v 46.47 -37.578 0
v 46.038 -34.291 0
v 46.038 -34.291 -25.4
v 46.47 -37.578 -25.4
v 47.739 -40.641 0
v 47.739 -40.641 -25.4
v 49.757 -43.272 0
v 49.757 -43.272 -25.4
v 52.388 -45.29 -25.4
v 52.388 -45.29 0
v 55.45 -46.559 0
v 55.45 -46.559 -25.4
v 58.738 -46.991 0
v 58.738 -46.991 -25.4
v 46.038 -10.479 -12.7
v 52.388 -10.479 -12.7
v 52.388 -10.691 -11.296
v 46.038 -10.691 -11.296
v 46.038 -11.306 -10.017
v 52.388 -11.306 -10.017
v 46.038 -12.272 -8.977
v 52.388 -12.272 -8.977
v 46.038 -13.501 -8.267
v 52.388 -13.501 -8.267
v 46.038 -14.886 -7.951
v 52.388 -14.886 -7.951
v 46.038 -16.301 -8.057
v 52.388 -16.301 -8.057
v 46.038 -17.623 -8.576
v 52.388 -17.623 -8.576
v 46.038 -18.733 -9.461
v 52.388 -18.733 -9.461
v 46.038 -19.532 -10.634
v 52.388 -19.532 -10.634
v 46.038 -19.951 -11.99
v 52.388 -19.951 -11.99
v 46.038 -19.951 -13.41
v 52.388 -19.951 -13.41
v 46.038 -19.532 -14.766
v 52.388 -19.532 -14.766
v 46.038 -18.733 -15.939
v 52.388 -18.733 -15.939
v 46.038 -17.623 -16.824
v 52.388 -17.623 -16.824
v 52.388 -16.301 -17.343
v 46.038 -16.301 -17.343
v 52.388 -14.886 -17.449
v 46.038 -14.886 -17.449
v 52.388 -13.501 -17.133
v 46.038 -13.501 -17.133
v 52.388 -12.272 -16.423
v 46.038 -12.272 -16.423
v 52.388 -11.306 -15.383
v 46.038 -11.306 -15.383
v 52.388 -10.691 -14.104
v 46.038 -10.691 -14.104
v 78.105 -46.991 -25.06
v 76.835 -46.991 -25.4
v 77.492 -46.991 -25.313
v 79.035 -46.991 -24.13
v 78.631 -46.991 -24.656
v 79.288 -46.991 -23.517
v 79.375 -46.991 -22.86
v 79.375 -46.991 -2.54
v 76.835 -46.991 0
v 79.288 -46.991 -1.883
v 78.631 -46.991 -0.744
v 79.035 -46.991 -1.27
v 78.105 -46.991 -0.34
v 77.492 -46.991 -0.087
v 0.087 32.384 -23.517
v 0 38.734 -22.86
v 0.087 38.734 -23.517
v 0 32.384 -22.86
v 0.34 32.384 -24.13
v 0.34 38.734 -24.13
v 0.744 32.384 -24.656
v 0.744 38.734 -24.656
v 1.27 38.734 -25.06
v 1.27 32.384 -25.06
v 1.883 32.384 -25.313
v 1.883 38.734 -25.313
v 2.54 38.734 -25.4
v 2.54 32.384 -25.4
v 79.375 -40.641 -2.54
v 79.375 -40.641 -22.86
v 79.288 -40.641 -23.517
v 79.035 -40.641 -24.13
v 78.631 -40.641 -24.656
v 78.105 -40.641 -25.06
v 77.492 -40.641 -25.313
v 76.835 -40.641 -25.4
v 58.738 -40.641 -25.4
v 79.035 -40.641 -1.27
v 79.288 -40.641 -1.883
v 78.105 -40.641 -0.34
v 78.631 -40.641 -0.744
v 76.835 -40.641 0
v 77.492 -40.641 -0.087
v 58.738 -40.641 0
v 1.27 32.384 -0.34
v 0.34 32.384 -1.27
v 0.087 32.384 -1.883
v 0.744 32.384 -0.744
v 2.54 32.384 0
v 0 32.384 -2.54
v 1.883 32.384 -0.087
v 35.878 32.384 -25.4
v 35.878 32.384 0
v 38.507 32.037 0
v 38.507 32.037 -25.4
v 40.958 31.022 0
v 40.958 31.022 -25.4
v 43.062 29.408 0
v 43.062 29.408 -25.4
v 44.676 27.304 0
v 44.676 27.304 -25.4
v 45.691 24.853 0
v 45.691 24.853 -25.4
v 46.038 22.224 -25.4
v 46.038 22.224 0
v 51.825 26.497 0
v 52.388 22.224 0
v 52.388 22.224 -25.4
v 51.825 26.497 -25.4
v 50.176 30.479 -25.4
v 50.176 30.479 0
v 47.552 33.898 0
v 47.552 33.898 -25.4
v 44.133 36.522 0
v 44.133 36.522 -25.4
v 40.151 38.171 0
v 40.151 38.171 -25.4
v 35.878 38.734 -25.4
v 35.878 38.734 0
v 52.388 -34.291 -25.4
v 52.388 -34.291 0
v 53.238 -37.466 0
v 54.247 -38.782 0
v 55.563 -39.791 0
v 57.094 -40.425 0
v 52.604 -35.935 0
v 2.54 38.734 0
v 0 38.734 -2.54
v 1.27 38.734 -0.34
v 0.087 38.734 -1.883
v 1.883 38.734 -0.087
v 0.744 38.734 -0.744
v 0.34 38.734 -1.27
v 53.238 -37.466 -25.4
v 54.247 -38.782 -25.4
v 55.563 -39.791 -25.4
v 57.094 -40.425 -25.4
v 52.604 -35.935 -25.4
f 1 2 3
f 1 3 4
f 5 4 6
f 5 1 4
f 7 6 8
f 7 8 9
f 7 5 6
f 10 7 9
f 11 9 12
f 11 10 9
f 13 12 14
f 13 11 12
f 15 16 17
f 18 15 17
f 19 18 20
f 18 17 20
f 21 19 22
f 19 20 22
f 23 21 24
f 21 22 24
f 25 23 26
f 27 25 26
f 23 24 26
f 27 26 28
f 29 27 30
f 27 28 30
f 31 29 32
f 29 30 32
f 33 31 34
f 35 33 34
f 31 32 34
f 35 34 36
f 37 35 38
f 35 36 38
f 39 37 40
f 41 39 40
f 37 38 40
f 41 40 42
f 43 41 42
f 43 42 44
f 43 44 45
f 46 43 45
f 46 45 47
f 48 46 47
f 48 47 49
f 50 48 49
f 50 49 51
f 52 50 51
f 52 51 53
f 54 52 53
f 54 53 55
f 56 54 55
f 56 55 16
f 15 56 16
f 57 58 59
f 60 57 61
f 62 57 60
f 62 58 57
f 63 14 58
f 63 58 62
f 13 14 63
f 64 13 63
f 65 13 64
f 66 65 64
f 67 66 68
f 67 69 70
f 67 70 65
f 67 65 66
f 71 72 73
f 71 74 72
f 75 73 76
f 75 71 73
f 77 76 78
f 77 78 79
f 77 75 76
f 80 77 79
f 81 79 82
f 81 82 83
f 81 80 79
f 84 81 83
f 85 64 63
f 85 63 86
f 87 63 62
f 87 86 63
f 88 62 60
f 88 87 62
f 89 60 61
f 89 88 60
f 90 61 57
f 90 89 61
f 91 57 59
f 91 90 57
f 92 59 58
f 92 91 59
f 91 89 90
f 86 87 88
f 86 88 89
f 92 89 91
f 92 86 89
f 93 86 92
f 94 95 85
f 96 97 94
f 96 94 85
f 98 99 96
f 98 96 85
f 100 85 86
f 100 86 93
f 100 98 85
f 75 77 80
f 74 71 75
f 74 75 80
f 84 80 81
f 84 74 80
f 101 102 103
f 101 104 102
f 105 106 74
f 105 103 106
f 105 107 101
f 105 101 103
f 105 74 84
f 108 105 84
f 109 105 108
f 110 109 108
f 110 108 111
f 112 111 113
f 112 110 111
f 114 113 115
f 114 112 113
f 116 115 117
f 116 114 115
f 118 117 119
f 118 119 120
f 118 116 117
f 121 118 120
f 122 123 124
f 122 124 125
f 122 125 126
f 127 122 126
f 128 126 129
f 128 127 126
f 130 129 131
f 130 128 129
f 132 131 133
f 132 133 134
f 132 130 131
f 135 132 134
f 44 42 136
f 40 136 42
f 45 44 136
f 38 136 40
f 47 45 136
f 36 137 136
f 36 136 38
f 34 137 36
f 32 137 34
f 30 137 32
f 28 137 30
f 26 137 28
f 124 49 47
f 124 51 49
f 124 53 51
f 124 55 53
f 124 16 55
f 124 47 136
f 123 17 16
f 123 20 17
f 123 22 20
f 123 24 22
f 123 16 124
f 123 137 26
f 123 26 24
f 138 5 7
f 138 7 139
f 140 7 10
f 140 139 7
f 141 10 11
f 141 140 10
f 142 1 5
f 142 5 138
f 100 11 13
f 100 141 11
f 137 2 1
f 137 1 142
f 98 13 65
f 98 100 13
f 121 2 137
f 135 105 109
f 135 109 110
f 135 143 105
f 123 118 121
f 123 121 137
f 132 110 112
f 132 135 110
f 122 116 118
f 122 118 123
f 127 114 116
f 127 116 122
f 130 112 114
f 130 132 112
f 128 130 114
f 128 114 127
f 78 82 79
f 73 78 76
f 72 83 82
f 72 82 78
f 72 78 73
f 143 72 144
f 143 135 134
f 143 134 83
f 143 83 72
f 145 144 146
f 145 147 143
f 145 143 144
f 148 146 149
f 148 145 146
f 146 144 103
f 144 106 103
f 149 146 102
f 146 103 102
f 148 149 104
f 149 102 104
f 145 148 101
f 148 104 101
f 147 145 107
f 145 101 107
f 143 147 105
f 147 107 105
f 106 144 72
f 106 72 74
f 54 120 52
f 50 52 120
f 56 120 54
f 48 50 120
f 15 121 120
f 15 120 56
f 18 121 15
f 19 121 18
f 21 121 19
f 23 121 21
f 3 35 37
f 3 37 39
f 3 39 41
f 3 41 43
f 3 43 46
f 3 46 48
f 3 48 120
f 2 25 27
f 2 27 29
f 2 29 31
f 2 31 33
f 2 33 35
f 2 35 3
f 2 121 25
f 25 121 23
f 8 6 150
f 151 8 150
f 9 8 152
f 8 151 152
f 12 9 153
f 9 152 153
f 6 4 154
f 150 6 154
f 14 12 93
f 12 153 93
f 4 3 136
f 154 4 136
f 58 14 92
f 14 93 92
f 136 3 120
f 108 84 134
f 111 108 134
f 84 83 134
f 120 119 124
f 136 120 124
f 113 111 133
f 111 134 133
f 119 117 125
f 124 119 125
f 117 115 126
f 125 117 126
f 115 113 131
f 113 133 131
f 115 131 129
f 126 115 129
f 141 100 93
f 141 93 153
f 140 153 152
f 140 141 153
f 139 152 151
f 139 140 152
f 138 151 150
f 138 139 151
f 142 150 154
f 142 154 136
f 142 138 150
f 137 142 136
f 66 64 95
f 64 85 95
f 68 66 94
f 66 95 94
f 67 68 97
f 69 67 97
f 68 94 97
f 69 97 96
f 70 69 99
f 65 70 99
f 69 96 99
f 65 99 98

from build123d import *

# Parameters (mm, degrees)
BOSS_EXTRUDE1_DEPTH = 25.4
FILLET1_R           = 2.54
SKETCH2_R           = 4.7625
CUT_EXTRUDE1_DEPTH  = 75.818479696


with BuildPart() as part:
    # Sketch1 → Boss-Extrude1 (new body)
    with BuildSketch(Plane.XY):
        with BuildLine():
            Line((0, 32.383567293), (35.8775, 32.383567293))
            ThreePointArc((35.8775, 32.383567293), (43.061704897, 29.40777219), (46.0375, 22.223567293))
            Line((46.0375, 22.223567293), (46.0375, -34.291432707))
            ThreePointArc((46.0375, -34.291432707), (49.757243879, -43.271688828), (58.7375, -46.991432707))
            Line((58.7375, -46.991432707), (79.375, -46.991432707))
            Line((79.375, -46.991432707), (79.375, -40.641432707))
            Line((79.375, -40.641432707), (58.7375, -40.641432707))
            ThreePointArc((58.7375, -40.641432707), (54.247371939, -38.781560767), (52.3875, -34.291432707))
            Line((52.3875, -34.291432707), (52.3875, 22.223567293))
            ThreePointArc((52.3875, 22.223567293), (47.551832957, 33.897900251), (35.8775, 38.733567293))
            Line((35.8775, 38.733567293), (0, 38.733567293))
            Line((0, 38.733567293), (0, 32.383567293))
        make_face()
    extrude(amount=-BOSS_EXTRUDE1_DEPTH)

    # Fillet1
    fillet1_edges = [part.edges().sort_by_distance(p)[0] for p in [
        (79.375, -43.816432707, 0),
        (0, 35.558567293, 0),
        (79.375, -43.816432707, -25.4),
        (0, 35.558567293, -25.4),
    ]]
    fillet(fillet1_edges, radius=FILLET1_R)

    # Sketch2 → Cut-Extrude1 (cut, through all)
    with BuildSketch(Plane(origin=(52.3875, 0, 0), x_dir=(0, 0, -1), z_dir=(1, 0, 0))):
        with Locations(Location((12.7, -15.241432707, 0), (0, 0, 90))):
            Circle(SKETCH2_R)
    extrude(amount=-CUT_EXTRUDE1_DEPTH, mode=Mode.SUBTRACT)


solid = part.part
